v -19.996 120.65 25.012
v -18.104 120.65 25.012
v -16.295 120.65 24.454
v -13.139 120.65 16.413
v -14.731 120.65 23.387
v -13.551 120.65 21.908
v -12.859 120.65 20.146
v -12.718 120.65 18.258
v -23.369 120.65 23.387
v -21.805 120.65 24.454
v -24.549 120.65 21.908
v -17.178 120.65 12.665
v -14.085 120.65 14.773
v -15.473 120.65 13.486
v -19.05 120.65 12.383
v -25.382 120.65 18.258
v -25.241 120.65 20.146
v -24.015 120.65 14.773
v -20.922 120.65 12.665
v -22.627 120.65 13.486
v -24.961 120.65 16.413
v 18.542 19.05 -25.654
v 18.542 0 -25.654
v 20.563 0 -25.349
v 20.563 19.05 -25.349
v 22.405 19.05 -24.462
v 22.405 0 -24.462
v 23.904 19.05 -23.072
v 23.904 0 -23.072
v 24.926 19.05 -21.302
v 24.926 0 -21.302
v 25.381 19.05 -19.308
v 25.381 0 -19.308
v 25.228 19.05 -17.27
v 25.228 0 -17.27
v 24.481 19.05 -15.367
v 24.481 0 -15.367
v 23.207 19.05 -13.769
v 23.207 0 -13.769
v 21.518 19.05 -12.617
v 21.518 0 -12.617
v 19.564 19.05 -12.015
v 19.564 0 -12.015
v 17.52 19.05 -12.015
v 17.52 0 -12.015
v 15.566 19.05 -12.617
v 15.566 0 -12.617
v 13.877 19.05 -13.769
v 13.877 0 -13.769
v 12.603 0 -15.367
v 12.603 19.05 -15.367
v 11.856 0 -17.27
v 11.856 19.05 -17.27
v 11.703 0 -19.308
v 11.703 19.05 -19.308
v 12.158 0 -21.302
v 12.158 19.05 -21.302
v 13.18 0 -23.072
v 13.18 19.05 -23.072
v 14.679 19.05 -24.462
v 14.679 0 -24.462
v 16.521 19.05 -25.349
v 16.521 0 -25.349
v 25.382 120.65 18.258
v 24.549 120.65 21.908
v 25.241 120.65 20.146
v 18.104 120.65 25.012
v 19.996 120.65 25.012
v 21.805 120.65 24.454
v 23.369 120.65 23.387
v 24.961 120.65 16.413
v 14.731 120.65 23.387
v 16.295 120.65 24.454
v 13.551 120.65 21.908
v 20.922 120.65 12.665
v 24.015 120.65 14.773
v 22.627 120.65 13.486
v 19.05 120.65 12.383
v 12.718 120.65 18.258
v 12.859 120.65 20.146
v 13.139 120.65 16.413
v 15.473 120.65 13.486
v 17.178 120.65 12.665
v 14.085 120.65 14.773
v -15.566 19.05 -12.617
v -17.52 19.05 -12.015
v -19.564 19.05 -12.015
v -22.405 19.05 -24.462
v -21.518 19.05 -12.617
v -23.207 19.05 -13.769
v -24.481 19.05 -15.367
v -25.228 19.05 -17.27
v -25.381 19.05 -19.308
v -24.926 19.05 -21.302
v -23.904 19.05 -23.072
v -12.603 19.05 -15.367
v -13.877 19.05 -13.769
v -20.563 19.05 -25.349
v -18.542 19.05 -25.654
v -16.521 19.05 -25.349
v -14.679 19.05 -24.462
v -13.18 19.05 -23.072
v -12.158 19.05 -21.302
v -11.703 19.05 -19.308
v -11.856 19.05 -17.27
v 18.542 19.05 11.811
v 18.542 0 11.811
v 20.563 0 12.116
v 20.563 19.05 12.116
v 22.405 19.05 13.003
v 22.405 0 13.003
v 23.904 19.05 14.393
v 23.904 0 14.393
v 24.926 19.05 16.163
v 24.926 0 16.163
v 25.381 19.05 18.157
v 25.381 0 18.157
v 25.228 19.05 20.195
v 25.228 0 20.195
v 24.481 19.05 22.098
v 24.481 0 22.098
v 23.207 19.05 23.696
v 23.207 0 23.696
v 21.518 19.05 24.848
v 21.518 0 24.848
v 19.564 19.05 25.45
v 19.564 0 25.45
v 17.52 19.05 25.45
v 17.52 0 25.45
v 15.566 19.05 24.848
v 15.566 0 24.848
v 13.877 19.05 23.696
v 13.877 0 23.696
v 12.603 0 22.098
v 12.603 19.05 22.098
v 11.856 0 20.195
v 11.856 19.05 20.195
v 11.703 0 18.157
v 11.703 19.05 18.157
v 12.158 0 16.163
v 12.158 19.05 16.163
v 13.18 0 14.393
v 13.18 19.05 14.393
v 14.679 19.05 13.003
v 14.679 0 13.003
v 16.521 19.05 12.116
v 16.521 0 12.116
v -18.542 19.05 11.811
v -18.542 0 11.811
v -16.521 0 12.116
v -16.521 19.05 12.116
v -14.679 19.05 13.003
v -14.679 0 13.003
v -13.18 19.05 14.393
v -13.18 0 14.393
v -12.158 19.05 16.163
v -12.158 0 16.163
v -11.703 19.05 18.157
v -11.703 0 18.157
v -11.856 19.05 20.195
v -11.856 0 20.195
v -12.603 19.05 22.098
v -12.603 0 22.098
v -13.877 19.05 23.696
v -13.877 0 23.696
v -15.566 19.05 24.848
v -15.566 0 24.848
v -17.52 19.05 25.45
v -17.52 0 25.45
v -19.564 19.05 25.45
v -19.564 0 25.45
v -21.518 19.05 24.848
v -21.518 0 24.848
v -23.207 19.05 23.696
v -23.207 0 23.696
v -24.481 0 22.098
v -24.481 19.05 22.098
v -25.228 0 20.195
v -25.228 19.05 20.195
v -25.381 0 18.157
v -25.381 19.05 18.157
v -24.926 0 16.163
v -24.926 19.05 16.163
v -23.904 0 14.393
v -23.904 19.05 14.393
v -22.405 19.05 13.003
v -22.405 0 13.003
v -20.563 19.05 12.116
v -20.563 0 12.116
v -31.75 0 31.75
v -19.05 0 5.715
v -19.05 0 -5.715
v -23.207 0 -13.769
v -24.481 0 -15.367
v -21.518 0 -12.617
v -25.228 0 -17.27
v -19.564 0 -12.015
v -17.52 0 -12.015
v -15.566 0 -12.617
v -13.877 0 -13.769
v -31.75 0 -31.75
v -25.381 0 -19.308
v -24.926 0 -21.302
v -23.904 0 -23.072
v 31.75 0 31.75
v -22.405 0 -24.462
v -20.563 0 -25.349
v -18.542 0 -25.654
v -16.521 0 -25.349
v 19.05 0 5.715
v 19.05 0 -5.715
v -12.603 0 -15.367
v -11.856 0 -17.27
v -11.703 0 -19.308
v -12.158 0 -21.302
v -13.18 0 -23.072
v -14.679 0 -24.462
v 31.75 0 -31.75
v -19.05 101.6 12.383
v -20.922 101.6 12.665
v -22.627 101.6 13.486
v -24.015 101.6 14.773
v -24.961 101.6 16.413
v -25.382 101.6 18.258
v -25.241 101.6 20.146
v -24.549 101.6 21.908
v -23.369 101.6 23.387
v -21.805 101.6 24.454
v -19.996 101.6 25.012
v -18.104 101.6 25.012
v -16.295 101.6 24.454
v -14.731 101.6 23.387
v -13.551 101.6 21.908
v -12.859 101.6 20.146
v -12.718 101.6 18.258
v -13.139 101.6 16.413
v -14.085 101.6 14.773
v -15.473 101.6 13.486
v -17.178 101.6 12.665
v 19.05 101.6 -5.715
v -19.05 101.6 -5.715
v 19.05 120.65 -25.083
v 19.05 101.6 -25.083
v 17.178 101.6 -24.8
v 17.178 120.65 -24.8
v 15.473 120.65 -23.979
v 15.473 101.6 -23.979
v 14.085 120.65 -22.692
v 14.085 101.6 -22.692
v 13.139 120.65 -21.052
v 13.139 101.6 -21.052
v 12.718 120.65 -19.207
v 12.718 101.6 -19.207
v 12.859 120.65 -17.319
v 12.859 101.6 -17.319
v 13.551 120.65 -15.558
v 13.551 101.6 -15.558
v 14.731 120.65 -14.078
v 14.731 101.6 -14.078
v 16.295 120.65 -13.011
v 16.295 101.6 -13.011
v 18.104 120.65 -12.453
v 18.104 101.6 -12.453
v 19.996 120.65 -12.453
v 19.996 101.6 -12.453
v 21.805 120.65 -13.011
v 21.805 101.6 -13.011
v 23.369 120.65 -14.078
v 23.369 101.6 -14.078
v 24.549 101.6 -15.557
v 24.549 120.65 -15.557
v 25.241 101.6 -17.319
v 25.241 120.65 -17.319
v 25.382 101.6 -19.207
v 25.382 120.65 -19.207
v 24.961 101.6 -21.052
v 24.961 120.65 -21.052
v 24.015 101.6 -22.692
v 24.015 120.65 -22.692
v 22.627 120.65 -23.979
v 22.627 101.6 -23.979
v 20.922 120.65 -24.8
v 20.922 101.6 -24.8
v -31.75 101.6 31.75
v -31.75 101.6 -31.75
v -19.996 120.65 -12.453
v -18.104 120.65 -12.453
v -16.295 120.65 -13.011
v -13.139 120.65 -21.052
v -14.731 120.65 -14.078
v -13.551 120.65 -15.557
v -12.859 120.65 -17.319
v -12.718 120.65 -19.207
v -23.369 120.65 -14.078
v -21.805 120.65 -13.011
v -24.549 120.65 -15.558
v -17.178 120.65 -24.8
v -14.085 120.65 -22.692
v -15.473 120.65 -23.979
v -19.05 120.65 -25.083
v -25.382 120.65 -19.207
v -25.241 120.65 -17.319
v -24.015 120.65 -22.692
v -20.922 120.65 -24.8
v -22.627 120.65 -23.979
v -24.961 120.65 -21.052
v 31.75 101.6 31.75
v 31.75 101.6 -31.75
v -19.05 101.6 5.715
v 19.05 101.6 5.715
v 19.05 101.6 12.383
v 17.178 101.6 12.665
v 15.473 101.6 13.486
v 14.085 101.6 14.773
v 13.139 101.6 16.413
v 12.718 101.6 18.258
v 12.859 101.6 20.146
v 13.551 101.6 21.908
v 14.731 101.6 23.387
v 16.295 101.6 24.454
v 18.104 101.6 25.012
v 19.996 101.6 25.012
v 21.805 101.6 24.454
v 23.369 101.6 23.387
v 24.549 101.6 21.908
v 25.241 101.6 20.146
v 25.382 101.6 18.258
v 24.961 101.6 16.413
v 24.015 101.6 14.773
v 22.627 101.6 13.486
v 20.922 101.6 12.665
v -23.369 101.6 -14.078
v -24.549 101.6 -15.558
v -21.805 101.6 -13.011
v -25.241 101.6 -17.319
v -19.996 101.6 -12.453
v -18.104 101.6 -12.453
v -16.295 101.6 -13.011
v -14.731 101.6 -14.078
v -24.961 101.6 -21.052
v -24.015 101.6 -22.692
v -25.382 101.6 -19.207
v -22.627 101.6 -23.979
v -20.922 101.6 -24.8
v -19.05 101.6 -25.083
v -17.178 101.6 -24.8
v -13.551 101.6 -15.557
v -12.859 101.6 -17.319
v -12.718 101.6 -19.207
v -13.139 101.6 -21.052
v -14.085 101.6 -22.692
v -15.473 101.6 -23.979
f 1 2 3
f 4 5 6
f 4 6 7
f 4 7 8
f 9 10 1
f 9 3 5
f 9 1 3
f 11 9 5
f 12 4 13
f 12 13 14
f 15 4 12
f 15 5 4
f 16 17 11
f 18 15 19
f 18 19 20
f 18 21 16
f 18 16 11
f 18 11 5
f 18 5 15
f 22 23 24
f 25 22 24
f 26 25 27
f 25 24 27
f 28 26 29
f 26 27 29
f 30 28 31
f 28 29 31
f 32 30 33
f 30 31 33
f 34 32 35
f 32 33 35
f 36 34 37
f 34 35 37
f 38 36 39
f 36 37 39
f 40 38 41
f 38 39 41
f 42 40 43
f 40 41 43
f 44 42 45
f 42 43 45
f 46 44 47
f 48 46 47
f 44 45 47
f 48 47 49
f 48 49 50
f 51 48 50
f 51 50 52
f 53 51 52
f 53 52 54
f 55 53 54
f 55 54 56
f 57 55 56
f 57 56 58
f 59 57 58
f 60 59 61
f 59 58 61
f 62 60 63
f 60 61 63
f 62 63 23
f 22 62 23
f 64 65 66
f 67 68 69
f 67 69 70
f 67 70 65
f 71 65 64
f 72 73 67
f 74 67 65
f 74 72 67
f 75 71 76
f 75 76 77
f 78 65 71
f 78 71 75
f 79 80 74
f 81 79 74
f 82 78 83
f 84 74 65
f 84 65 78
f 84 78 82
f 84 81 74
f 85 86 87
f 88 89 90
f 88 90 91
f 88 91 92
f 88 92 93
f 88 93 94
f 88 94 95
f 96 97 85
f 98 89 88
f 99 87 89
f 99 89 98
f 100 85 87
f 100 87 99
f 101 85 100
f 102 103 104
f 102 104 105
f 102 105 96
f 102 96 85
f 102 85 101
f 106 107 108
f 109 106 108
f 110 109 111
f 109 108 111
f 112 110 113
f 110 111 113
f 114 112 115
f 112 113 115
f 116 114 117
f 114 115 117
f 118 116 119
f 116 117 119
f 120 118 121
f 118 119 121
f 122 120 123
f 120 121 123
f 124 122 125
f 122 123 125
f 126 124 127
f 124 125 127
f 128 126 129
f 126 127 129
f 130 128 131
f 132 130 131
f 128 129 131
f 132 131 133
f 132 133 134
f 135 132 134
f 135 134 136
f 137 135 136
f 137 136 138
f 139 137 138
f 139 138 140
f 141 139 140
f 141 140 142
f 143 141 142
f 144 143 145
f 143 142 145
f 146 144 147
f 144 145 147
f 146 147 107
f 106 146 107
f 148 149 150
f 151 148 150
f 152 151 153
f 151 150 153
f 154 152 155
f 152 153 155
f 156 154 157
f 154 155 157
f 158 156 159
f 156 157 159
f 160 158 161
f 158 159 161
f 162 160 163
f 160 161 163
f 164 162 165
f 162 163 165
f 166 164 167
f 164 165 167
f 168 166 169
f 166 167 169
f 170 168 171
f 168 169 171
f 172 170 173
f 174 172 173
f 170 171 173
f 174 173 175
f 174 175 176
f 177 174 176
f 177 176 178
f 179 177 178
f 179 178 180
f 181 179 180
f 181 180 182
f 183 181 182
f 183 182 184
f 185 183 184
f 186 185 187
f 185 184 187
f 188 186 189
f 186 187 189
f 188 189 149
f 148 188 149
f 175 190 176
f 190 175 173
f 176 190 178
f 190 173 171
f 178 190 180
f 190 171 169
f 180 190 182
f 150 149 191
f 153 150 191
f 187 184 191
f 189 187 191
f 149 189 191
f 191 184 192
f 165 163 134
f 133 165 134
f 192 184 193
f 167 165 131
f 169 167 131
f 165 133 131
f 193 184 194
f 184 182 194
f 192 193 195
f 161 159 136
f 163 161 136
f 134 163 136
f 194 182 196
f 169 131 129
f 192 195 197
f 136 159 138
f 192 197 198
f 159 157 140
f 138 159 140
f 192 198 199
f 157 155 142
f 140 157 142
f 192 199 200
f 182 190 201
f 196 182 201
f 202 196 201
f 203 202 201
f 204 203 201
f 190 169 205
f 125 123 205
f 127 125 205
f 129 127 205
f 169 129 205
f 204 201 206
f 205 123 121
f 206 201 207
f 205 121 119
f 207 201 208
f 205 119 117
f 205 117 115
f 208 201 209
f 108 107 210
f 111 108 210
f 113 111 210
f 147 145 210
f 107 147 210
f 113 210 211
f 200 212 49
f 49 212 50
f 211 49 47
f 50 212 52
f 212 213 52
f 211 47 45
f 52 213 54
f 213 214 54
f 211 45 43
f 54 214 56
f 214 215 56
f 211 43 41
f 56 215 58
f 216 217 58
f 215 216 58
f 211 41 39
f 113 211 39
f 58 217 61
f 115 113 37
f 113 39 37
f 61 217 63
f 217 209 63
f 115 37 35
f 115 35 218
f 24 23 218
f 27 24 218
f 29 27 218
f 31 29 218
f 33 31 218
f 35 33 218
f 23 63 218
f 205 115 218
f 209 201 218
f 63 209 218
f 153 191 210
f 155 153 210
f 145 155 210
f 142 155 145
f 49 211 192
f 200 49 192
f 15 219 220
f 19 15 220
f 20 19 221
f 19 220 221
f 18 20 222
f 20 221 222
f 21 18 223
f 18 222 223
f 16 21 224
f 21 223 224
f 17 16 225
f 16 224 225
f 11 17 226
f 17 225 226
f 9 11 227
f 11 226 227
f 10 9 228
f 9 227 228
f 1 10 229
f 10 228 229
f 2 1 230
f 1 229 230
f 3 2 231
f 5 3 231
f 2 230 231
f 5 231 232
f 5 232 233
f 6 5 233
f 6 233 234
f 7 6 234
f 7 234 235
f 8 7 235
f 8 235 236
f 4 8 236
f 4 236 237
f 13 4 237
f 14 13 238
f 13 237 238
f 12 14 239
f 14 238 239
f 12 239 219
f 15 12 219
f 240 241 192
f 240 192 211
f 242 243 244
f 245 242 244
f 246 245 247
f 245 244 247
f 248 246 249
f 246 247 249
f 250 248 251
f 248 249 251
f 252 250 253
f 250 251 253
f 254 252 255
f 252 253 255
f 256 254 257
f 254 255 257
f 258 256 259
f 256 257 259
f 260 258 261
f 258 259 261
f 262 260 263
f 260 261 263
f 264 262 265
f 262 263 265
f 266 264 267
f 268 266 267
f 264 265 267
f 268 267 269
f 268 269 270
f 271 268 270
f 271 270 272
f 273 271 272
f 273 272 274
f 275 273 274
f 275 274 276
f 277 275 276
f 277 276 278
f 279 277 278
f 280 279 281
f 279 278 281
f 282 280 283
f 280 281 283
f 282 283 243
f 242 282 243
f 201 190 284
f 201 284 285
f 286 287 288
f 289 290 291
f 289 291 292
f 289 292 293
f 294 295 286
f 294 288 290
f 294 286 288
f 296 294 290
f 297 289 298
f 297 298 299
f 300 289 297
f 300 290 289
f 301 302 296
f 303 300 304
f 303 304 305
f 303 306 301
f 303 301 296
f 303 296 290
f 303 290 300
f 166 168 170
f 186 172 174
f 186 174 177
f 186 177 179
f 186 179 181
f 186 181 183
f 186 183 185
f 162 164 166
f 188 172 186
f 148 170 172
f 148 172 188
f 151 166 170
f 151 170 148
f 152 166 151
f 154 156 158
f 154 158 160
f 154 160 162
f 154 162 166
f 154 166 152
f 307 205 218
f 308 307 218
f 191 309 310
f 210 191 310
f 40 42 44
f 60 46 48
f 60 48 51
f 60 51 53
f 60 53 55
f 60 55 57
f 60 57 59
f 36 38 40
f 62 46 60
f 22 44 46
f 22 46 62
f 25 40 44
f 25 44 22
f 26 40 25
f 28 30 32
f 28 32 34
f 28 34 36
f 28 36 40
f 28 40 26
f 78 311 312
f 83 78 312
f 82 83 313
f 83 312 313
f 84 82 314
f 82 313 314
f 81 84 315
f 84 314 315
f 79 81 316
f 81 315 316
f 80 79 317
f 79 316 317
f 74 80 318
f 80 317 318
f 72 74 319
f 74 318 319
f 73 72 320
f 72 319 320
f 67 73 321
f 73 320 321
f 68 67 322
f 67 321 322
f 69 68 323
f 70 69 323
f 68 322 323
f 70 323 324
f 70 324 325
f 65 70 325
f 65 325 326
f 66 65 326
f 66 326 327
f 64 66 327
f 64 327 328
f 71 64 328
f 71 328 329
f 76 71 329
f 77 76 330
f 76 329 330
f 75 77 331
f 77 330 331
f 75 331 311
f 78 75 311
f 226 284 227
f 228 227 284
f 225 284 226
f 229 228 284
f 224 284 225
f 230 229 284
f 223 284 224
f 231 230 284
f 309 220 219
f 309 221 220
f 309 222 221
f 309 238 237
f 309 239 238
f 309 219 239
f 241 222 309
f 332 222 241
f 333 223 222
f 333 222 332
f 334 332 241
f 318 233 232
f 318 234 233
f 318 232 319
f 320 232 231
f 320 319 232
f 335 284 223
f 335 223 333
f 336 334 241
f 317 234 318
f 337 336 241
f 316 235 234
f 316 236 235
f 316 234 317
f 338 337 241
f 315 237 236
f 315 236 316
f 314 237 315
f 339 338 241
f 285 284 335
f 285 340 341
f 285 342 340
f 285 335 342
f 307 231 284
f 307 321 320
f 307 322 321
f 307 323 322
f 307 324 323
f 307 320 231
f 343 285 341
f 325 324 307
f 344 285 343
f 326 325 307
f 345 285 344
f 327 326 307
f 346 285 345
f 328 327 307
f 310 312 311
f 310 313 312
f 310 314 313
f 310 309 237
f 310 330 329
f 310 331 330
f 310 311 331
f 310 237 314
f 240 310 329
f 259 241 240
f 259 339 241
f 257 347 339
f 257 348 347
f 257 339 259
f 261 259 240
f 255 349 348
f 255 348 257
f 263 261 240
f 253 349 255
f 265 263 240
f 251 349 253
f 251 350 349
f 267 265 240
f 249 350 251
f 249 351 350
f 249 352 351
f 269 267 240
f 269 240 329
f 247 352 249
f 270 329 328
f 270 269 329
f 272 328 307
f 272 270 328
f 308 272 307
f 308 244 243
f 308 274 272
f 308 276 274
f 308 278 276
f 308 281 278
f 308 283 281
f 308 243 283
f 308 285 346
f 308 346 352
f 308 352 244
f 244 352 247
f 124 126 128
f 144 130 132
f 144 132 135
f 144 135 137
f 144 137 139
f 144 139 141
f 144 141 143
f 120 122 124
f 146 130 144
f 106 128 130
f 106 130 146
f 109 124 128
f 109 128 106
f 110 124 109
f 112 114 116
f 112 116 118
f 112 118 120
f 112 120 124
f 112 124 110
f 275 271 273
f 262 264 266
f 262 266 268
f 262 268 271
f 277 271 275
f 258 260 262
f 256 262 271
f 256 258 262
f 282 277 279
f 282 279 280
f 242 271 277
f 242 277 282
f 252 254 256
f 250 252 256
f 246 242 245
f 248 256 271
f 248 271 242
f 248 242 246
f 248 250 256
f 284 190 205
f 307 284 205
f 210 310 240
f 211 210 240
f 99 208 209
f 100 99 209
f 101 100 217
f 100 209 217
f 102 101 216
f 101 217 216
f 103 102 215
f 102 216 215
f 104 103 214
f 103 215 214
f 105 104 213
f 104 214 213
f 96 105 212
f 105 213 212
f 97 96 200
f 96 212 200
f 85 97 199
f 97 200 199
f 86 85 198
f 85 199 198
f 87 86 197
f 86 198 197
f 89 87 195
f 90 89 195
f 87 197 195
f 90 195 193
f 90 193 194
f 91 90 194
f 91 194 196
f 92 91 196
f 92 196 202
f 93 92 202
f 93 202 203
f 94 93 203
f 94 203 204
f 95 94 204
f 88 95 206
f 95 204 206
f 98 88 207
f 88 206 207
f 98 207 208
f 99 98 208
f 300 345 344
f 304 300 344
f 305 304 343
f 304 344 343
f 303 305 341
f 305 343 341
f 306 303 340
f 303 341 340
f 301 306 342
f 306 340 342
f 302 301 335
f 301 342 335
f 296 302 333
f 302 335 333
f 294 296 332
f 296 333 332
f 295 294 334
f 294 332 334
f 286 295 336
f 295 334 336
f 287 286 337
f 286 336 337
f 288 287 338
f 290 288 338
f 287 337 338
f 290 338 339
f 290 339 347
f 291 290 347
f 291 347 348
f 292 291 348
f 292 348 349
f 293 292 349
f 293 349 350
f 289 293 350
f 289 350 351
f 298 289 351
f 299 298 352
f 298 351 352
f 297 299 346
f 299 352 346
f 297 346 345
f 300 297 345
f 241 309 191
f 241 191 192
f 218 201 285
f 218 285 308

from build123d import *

# Parameters (mm, degrees)
SKETCH1_W           = 63.5
SKETCH1_H           = 63.5
BOSS_EXTRUDE1_DEPTH = 101.6
SKETCH3_W           = 38.1
SKETCH3_H           = 11.43
CUT_EXTRUDE1_DEPTH  = 112.079633597
SKETCH5_R           = 6.35
BOSS_EXTRUDE2_DEPTH = 19.05
SKETCH6_R           = 6.858
CUT_EXTRUDE3_DEPTH  = 19.05


with BuildPart() as part:
    # Sketch1 → Boss-Extrude1 (new body)
    with BuildSketch(Plane(origin=(0, 0, 0), x_dir=(1, 0, 0), z_dir=(0, 1, 0))):
        Rectangle(SKETCH1_W, SKETCH1_H)
    extrude(amount=BOSS_EXTRUDE1_DEPTH)

    # Sketch3 → Cut-Extrude1 (cut, through all)
    with BuildSketch(Plane(origin=(0, 101.6, 0), x_dir=(1, 0, 0), z_dir=(0, 1, 0))):
        Rectangle(SKETCH3_W, SKETCH3_H)
    extrude(amount=-CUT_EXTRUDE1_DEPTH, mode=Mode.SUBTRACT)

    # Sketch5 → Boss-Extrude2 (add)
    with BuildSketch(Plane(origin=(0, 101.6, 0), x_dir=(1, 0, 0), z_dir=(0, 1, 0))):
        with Locations(Location((19.05, -18.7325, 0), (0, 0, 90))):
            Circle(SKETCH5_R)
        with Locations(Location((-19.05, -18.7325, 0), (0, 0, 90))):
            Circle(SKETCH5_R)
        with Locations(Location((-19.05, 18.7325, 0), (0, 0, 90))):
            Circle(SKETCH5_R)
        with Locations(Location((19.05, 18.7325, 0), (0, 0, 90))):
            Circle(SKETCH5_R)
    extrude(amount=BOSS_EXTRUDE2_DEPTH)

    # Sketch6 → Cut-Extrude3 (cut)
    with BuildSketch(Plane.XZ):
        with Locations(Location((18.542, -18.796, 0), (0, 0, 270))):
            Circle(SKETCH6_R)
        with Locations(Location((-18.542, -18.796, 0), (0, 0, 270))):
            Circle(SKETCH6_R)
        with Locations(Location((-18.542, 18.669, 0), (0, 0, 270))):
            Circle(SKETCH6_R)
        with Locations(Location((18.542, 18.669, 0), (0, 0, 270))):
            Circle(SKETCH6_R)
    extrude(amount=-CUT_EXTRUDE3_DEPTH, mode=Mode.SUBTRACT)


solid = part.part
